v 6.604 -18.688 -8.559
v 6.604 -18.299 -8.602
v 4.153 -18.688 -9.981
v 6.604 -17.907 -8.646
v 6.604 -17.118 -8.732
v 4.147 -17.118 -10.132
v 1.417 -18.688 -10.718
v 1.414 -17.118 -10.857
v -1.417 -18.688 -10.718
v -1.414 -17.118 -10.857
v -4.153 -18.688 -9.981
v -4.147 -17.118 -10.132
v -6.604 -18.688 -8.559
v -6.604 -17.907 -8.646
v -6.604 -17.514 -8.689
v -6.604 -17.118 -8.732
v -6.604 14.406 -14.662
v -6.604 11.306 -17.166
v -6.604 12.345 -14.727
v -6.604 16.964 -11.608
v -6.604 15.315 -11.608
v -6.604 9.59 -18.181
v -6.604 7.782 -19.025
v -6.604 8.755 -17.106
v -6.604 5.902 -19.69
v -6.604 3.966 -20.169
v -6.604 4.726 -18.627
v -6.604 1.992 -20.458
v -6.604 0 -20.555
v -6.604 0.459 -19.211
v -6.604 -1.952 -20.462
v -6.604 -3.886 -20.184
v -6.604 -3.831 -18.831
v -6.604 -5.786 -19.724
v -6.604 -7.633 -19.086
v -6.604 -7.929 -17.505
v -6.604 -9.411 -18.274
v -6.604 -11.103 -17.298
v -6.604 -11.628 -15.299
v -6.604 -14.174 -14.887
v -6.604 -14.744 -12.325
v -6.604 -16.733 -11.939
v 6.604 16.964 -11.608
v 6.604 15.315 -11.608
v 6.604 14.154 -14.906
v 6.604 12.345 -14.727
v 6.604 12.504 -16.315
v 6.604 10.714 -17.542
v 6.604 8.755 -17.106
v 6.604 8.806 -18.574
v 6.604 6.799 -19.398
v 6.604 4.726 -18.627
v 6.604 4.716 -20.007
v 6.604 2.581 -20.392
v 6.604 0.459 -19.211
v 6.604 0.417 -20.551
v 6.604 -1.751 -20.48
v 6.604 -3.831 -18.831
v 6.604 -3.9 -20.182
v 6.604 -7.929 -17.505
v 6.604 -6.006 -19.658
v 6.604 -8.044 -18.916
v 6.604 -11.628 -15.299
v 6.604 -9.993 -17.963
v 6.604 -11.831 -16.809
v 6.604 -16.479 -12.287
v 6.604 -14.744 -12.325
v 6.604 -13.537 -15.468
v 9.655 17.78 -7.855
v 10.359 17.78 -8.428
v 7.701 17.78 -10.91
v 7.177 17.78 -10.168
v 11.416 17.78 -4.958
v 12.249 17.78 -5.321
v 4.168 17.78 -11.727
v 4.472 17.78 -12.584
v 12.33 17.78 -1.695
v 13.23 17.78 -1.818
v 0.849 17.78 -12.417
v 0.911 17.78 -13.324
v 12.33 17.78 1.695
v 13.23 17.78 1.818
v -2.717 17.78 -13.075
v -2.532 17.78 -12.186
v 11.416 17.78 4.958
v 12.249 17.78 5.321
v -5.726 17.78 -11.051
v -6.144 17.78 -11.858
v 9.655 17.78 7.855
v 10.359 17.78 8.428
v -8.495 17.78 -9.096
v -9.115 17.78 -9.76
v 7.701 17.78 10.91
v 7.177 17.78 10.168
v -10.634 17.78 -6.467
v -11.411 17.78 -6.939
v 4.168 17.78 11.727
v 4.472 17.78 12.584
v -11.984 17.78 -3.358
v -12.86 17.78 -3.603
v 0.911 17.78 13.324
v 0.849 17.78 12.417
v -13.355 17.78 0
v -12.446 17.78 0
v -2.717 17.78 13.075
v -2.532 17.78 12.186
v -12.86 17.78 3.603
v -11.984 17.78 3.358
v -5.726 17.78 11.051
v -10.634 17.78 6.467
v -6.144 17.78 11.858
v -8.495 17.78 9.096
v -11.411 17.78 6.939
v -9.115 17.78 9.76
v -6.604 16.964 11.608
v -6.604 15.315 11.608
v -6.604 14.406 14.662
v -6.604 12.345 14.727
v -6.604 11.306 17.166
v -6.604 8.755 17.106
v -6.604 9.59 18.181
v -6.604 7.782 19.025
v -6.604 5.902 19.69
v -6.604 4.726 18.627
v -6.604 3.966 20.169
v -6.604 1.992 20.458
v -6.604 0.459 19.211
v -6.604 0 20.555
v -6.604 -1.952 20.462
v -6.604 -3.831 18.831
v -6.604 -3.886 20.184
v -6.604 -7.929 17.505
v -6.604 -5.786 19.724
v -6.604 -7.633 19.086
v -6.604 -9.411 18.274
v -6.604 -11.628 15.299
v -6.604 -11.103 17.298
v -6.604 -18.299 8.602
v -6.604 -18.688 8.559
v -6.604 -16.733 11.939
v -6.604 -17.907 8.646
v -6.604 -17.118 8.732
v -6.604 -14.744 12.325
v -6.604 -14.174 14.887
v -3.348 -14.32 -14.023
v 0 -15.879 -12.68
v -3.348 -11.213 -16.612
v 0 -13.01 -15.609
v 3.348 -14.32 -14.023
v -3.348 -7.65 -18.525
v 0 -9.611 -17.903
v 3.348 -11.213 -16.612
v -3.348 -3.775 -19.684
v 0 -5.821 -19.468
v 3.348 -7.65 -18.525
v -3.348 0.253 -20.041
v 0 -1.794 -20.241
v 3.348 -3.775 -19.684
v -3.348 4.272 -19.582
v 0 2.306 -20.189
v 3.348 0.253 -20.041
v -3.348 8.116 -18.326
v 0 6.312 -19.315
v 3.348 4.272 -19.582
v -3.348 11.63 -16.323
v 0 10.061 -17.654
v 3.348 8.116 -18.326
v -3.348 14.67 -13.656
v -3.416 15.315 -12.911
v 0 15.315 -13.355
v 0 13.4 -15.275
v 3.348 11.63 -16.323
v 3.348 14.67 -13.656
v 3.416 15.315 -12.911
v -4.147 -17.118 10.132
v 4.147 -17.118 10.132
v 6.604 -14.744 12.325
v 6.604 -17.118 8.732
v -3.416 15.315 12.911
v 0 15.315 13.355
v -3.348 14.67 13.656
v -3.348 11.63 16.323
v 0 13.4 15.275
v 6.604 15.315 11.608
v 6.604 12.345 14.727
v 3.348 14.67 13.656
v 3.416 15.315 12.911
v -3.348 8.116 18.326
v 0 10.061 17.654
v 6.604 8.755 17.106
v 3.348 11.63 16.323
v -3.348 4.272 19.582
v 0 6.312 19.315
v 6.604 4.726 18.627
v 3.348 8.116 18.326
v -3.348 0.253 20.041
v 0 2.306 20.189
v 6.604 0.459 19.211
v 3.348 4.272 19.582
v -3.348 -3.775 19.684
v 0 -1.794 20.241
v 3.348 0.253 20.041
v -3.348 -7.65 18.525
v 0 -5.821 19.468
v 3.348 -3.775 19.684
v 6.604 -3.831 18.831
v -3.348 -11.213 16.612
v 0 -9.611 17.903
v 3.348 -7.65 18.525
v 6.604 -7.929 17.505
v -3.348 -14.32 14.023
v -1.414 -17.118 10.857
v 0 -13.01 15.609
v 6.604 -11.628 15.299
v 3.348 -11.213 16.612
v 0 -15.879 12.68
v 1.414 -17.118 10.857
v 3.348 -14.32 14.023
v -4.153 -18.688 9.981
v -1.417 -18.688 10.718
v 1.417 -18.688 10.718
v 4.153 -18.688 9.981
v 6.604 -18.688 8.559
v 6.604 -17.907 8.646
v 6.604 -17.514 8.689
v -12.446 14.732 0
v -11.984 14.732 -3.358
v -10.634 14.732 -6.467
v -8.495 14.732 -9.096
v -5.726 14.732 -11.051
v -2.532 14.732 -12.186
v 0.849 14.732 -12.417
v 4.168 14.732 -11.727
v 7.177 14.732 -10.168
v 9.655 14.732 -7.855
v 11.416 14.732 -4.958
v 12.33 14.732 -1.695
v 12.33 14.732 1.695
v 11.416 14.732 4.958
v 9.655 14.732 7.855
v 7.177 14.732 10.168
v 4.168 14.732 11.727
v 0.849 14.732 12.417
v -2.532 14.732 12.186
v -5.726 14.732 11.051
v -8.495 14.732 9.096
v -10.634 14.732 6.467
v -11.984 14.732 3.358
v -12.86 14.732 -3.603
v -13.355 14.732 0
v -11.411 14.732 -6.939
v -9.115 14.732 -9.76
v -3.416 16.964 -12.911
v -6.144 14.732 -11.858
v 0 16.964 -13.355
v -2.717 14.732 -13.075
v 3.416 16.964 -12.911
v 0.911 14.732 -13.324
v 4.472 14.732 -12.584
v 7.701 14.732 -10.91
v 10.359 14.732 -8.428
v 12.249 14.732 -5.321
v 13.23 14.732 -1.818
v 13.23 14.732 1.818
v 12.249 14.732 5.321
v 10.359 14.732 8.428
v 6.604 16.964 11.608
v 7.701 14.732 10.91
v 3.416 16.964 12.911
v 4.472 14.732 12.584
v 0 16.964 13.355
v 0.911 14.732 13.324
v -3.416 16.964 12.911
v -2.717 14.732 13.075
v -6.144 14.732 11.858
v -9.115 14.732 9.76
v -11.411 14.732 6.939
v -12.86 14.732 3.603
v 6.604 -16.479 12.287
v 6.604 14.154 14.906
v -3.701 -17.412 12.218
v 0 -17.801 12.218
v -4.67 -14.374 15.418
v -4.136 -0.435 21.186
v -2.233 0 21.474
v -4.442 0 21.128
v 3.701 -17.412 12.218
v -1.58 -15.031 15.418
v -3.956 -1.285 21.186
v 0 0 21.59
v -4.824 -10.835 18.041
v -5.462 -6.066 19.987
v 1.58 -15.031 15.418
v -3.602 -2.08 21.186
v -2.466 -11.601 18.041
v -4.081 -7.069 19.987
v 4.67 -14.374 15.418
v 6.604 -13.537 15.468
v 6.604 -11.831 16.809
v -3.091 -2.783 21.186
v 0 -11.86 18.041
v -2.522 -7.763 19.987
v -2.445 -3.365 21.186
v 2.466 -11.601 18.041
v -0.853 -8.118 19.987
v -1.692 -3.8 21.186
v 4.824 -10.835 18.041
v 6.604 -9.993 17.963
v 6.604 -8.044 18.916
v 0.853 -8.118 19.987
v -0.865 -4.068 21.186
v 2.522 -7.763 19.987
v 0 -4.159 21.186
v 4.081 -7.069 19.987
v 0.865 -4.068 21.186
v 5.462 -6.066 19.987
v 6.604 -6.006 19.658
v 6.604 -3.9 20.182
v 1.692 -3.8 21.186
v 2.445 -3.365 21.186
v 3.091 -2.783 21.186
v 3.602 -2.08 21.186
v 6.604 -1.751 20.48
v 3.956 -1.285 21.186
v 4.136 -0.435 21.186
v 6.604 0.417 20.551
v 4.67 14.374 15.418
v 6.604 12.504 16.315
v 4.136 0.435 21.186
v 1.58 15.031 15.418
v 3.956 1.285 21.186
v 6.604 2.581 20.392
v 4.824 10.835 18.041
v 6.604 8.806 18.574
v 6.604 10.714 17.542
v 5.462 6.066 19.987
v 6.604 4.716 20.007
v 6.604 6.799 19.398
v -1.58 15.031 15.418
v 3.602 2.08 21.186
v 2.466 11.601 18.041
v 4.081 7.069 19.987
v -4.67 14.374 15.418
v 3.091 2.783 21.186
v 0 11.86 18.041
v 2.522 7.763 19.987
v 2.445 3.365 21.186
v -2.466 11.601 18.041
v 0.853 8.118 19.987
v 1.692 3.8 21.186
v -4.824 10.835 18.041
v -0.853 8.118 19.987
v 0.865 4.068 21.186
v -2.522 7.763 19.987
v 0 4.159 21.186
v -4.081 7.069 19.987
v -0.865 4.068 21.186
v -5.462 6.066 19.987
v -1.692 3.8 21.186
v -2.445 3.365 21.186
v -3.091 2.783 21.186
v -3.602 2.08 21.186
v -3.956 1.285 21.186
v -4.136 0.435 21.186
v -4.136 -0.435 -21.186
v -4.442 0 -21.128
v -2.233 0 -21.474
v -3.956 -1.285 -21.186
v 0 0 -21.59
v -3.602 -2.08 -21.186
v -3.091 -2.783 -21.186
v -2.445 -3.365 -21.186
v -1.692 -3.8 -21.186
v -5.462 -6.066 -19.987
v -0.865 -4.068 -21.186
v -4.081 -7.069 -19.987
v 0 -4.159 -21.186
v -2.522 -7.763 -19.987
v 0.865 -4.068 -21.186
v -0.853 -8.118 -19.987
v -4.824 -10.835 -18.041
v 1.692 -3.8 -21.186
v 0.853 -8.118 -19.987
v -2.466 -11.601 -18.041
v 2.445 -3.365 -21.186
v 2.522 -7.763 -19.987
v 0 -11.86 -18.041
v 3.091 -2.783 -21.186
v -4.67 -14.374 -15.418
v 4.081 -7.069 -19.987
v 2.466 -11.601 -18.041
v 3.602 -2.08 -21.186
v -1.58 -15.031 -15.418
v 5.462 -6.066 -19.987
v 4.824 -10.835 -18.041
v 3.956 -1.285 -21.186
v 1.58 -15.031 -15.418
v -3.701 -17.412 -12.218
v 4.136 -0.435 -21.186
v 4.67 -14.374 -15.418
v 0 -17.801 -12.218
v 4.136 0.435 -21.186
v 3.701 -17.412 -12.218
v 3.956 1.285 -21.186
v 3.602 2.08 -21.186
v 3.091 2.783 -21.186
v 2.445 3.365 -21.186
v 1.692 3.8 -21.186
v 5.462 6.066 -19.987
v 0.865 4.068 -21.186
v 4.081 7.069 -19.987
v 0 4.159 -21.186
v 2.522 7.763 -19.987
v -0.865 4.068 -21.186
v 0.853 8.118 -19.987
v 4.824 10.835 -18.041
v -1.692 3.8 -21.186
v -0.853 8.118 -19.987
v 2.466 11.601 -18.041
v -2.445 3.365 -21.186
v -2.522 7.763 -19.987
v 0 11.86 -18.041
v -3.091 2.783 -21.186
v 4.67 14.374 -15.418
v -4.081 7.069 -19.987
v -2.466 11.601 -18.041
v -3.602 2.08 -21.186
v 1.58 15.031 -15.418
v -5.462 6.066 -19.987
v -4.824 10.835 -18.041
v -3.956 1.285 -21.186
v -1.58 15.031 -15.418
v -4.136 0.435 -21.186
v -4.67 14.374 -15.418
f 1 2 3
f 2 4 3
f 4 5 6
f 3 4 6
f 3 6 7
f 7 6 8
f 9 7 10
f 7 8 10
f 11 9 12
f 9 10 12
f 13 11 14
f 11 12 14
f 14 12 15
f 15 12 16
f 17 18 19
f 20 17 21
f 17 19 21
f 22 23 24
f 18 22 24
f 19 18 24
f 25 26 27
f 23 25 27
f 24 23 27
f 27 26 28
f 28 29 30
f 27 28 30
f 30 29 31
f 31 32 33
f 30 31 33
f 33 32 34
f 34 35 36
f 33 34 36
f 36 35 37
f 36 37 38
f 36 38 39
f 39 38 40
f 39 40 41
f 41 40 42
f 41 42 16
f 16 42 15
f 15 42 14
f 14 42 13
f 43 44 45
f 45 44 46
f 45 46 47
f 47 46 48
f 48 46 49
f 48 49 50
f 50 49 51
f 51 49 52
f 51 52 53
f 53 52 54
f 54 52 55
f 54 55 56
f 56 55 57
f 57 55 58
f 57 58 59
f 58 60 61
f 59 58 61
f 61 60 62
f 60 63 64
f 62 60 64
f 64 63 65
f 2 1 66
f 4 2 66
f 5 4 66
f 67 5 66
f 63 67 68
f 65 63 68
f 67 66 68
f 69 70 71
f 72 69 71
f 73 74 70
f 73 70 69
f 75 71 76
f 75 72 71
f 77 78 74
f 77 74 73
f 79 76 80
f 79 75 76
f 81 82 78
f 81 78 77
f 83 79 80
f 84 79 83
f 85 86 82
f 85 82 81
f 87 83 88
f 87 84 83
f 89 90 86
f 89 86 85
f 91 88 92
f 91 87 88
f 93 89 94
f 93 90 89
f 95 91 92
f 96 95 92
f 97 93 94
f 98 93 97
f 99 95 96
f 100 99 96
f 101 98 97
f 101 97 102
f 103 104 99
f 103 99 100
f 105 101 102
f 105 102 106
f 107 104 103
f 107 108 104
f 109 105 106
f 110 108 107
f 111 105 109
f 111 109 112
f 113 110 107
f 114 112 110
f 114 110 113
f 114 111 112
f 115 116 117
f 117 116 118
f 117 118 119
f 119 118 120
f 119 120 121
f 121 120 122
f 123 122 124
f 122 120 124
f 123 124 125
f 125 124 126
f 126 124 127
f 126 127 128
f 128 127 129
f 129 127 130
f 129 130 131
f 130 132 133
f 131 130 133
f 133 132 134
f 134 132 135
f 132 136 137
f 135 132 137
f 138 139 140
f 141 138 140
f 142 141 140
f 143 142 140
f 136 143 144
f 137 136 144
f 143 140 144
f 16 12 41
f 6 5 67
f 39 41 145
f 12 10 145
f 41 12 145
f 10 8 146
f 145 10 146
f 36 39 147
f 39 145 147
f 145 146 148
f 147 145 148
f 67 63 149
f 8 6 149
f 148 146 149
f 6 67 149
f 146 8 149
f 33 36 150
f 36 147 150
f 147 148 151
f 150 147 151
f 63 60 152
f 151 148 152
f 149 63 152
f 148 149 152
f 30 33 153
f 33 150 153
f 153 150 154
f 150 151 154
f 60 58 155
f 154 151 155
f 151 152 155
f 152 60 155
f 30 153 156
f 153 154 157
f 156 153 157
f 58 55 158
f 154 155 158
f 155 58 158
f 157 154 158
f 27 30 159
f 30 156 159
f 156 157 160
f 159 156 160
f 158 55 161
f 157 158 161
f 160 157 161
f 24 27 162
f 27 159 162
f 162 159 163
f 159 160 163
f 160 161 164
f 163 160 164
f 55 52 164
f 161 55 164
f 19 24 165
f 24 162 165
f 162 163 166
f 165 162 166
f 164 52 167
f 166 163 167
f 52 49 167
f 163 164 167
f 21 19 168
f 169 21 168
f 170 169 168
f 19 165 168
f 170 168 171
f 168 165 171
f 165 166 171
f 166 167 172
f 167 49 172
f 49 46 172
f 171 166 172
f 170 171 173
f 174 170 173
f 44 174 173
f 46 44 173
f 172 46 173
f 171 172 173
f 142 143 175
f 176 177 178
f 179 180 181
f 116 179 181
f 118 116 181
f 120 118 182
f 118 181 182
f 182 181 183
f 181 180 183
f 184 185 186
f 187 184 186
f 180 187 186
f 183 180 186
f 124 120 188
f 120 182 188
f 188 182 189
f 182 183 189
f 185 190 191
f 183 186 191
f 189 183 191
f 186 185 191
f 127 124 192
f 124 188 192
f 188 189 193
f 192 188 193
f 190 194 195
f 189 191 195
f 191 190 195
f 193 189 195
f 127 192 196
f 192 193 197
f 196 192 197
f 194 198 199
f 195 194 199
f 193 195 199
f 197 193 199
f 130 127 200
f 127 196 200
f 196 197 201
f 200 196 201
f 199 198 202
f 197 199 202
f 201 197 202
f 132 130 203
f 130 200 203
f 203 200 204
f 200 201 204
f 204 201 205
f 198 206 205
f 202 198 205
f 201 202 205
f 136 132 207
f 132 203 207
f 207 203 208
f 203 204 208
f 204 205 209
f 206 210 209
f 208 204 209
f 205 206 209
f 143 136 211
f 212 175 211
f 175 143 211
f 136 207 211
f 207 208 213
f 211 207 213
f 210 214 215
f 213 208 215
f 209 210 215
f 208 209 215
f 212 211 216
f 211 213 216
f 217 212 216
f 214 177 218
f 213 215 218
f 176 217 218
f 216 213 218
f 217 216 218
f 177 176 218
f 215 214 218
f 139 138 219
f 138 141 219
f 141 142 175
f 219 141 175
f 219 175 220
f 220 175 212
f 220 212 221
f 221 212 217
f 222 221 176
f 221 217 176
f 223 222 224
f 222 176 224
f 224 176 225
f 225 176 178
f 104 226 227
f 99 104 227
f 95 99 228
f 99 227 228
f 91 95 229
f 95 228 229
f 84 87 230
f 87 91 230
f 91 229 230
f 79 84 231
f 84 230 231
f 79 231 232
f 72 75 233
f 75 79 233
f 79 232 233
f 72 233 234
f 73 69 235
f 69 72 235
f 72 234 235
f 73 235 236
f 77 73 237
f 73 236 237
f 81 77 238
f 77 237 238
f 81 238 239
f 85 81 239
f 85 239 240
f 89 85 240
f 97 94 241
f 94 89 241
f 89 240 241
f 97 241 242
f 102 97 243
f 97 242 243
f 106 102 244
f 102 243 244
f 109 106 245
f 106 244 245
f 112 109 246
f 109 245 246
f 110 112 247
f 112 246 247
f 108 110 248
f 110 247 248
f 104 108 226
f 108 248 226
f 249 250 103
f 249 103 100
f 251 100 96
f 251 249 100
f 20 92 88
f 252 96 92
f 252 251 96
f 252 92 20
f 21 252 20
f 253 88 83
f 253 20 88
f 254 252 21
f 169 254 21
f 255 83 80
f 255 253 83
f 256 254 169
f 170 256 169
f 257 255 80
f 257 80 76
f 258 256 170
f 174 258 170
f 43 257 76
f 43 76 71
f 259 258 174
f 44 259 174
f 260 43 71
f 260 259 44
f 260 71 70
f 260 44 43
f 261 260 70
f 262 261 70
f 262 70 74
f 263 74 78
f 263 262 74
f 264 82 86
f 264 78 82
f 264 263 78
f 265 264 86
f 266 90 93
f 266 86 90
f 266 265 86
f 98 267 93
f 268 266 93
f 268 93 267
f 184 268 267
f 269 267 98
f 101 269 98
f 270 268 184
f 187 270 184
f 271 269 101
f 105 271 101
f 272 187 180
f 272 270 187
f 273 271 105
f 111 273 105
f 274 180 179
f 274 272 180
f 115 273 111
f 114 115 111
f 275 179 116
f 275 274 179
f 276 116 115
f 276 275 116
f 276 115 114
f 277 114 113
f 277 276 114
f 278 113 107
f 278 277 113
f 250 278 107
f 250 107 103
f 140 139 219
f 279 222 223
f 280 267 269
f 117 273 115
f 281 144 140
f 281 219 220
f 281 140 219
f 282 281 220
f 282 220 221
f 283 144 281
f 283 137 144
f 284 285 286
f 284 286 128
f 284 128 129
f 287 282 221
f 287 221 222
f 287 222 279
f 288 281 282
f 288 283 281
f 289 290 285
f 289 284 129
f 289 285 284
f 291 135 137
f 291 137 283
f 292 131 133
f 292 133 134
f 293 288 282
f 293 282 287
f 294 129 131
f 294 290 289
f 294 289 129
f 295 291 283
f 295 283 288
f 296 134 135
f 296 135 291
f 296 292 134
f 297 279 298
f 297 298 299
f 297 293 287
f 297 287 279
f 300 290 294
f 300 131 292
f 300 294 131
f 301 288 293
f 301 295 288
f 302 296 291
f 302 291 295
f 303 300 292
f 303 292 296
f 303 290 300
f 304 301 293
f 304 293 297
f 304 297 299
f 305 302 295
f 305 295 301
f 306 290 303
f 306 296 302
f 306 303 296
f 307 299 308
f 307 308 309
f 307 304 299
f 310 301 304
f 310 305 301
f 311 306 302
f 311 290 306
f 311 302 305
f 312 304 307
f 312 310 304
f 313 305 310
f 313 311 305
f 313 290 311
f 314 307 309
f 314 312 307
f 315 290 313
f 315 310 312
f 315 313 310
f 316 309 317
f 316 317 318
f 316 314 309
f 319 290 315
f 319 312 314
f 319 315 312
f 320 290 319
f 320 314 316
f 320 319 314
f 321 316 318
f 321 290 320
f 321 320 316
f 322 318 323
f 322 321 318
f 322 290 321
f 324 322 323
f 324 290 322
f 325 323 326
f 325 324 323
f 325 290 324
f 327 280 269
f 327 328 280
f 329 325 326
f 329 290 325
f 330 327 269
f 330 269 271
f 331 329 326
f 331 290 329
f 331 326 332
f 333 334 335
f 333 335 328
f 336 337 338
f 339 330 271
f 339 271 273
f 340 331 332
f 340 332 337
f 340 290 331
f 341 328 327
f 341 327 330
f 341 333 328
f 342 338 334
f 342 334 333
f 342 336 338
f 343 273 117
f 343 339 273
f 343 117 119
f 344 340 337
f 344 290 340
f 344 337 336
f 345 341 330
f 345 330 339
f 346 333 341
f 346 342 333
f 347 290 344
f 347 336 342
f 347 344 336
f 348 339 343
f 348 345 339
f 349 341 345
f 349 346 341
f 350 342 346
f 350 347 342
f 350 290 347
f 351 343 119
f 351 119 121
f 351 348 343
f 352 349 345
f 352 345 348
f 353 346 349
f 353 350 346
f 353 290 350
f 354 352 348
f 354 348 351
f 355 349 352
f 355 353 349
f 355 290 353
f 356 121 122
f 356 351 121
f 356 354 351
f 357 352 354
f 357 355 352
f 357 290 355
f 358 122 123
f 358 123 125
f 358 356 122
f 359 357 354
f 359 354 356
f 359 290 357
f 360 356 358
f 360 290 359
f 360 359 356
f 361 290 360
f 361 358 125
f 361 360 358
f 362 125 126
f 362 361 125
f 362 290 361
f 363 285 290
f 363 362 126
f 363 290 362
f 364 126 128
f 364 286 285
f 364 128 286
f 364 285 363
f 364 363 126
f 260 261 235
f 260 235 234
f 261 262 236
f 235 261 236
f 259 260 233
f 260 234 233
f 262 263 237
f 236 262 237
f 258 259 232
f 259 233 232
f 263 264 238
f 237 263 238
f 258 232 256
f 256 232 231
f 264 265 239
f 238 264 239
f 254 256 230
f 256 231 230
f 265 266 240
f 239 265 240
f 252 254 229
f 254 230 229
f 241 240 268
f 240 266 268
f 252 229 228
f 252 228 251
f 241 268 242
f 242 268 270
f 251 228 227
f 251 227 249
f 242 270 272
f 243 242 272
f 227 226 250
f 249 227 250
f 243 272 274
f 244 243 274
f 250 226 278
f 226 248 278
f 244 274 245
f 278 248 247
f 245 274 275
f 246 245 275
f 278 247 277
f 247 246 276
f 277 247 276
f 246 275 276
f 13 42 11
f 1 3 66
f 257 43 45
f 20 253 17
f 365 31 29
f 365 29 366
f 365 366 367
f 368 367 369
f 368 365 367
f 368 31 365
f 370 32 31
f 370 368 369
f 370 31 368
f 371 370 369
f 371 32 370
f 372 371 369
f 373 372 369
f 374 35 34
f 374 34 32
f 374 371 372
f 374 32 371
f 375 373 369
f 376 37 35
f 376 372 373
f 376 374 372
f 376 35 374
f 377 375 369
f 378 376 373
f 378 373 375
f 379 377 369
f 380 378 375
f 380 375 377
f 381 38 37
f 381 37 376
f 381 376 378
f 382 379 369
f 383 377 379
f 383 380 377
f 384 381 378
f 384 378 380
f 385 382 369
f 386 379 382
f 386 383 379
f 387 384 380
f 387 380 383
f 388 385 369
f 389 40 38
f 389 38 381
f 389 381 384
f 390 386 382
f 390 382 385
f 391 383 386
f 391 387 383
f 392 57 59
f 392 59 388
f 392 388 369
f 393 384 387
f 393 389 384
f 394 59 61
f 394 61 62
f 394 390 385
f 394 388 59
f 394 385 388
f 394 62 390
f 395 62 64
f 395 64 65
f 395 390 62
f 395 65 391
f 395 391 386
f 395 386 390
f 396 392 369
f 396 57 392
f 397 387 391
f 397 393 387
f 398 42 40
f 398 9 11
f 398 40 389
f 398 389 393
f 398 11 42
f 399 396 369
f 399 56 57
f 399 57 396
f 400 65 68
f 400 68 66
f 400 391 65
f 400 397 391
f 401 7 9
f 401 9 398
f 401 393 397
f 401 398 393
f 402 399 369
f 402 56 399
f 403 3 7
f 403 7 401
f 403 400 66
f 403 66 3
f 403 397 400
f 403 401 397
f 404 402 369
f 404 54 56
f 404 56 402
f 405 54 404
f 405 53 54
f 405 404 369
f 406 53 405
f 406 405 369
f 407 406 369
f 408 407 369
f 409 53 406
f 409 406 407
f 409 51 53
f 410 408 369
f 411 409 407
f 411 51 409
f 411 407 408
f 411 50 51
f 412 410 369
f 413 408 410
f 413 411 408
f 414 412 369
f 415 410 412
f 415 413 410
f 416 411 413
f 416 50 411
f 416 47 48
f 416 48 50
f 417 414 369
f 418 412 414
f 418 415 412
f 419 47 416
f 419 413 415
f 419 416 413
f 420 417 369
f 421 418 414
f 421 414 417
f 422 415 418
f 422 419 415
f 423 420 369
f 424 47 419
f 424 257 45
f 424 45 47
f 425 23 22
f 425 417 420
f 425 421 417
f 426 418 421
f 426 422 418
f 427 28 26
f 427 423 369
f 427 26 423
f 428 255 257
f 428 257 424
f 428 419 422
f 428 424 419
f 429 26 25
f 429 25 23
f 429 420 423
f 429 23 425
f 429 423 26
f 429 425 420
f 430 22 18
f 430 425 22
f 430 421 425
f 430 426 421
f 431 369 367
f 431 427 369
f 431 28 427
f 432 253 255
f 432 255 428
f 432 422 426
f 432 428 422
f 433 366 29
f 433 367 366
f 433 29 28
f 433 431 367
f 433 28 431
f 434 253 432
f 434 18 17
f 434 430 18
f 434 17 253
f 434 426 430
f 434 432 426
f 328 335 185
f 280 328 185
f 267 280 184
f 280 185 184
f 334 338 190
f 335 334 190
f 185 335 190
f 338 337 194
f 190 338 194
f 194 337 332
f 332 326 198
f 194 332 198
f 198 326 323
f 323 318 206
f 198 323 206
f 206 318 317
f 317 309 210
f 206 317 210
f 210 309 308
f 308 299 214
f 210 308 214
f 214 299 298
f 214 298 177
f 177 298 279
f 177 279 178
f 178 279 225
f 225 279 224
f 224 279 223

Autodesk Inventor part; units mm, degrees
ref_plane "XY Plane" through (0, 0, 0) normal (0, 0, 1) x (1, 0, 0)
sketch "Sketch1" plane through (0, 0, 0) normal (0, 1, 0) x (-1, 0, 0)
  circle A0 centre (0, 0) radius 21.59
  line L0 (0, -21.59) -> (0, 21.59)
  dimension "d0" = 43.18
revolve "Revolution1" add sketch "Sketch1" angle 360 about axis through (0, 0, -21.59) along (0, 0, 1)
sketch "Sketch2" plane through (0, 0, 0) normal (0, 1, 0) x (-1, 0, 0)
  line L0 (-6.604, -23.7777) -> (-21.7081, -23.7777)
  line L1 (-21.7081, -23.7777) -> (-21.7081, 23.9273)
  line L2 (-21.7081, 23.9273) -> (-6.604, 23.9273)
  line L3 (-6.604, 23.9273) -> (-6.604, -23.7777)
  line L4 (6.604, 26.32) -> (23.3531, 26.32)
  line L5 (23.3531, 26.32) -> (23.3531, -25.5723)
  line L6 (23.3531, -25.5723) -> (6.604, -25.5723)
  line L7 (6.604, -25.5723) -> (6.604, 26.32)
  point P0 (0, 0)
  dimension "d2" = 6.604
  dimension "d3" = 6.604
extrude "Extrusion1" cut sketch "Sketch2" along normal mid plane 50.8
sketch "Sketch3" plane through (0, 0, 0) normal (0, 1, 0) x (-1, 0, 0)
  circle A0 centre (0, 0) radius 12.446
  dimension "d6" = 24.892
extrude "Extrusion2" cut sketch "Sketch3" along normal blind 47.625 and the other way blind 22.2377 draft -5
sketch "Sketch4" plane through (0, 0, 0) normal (0, 1, 0) x (-1, 0, 0)
  circle A0 centre (0, 0) radius 20.32
  line L0 (20.32, 0) -> (-20.32, 0)
  dimension "d11" = 40.64
revolve "Revolution2" cut sketch "Sketch4" angle 360 about axis through (-20.32, 0, 0) along (1, 0, 0)
sketch "Sketch5" plane through (0, 0, 0) normal (0, 1, 0) x (-1, 0, 0)
  circle A0 centre (0, 0) radius 13.3548
  circle A1 centre (0, 0) radius 12.446
extrude "Extrusion3" add sketch "Sketch5" along normal blind 17.78
sketch "Sketch6" plane through (0, 0, 0) normal (0, 1, 0) x (-1, 0, 0)
  circle A0 centre (0, 0) radius 12.446
  circle A1 centre (0, 0) radius 12.446 projected
  circle A2 centre (0, 0) radius 13.3548
extrude "Extrusion4" cut sketch "Sketch6" along normal blind 14.732
properties part number "mid_panel"
